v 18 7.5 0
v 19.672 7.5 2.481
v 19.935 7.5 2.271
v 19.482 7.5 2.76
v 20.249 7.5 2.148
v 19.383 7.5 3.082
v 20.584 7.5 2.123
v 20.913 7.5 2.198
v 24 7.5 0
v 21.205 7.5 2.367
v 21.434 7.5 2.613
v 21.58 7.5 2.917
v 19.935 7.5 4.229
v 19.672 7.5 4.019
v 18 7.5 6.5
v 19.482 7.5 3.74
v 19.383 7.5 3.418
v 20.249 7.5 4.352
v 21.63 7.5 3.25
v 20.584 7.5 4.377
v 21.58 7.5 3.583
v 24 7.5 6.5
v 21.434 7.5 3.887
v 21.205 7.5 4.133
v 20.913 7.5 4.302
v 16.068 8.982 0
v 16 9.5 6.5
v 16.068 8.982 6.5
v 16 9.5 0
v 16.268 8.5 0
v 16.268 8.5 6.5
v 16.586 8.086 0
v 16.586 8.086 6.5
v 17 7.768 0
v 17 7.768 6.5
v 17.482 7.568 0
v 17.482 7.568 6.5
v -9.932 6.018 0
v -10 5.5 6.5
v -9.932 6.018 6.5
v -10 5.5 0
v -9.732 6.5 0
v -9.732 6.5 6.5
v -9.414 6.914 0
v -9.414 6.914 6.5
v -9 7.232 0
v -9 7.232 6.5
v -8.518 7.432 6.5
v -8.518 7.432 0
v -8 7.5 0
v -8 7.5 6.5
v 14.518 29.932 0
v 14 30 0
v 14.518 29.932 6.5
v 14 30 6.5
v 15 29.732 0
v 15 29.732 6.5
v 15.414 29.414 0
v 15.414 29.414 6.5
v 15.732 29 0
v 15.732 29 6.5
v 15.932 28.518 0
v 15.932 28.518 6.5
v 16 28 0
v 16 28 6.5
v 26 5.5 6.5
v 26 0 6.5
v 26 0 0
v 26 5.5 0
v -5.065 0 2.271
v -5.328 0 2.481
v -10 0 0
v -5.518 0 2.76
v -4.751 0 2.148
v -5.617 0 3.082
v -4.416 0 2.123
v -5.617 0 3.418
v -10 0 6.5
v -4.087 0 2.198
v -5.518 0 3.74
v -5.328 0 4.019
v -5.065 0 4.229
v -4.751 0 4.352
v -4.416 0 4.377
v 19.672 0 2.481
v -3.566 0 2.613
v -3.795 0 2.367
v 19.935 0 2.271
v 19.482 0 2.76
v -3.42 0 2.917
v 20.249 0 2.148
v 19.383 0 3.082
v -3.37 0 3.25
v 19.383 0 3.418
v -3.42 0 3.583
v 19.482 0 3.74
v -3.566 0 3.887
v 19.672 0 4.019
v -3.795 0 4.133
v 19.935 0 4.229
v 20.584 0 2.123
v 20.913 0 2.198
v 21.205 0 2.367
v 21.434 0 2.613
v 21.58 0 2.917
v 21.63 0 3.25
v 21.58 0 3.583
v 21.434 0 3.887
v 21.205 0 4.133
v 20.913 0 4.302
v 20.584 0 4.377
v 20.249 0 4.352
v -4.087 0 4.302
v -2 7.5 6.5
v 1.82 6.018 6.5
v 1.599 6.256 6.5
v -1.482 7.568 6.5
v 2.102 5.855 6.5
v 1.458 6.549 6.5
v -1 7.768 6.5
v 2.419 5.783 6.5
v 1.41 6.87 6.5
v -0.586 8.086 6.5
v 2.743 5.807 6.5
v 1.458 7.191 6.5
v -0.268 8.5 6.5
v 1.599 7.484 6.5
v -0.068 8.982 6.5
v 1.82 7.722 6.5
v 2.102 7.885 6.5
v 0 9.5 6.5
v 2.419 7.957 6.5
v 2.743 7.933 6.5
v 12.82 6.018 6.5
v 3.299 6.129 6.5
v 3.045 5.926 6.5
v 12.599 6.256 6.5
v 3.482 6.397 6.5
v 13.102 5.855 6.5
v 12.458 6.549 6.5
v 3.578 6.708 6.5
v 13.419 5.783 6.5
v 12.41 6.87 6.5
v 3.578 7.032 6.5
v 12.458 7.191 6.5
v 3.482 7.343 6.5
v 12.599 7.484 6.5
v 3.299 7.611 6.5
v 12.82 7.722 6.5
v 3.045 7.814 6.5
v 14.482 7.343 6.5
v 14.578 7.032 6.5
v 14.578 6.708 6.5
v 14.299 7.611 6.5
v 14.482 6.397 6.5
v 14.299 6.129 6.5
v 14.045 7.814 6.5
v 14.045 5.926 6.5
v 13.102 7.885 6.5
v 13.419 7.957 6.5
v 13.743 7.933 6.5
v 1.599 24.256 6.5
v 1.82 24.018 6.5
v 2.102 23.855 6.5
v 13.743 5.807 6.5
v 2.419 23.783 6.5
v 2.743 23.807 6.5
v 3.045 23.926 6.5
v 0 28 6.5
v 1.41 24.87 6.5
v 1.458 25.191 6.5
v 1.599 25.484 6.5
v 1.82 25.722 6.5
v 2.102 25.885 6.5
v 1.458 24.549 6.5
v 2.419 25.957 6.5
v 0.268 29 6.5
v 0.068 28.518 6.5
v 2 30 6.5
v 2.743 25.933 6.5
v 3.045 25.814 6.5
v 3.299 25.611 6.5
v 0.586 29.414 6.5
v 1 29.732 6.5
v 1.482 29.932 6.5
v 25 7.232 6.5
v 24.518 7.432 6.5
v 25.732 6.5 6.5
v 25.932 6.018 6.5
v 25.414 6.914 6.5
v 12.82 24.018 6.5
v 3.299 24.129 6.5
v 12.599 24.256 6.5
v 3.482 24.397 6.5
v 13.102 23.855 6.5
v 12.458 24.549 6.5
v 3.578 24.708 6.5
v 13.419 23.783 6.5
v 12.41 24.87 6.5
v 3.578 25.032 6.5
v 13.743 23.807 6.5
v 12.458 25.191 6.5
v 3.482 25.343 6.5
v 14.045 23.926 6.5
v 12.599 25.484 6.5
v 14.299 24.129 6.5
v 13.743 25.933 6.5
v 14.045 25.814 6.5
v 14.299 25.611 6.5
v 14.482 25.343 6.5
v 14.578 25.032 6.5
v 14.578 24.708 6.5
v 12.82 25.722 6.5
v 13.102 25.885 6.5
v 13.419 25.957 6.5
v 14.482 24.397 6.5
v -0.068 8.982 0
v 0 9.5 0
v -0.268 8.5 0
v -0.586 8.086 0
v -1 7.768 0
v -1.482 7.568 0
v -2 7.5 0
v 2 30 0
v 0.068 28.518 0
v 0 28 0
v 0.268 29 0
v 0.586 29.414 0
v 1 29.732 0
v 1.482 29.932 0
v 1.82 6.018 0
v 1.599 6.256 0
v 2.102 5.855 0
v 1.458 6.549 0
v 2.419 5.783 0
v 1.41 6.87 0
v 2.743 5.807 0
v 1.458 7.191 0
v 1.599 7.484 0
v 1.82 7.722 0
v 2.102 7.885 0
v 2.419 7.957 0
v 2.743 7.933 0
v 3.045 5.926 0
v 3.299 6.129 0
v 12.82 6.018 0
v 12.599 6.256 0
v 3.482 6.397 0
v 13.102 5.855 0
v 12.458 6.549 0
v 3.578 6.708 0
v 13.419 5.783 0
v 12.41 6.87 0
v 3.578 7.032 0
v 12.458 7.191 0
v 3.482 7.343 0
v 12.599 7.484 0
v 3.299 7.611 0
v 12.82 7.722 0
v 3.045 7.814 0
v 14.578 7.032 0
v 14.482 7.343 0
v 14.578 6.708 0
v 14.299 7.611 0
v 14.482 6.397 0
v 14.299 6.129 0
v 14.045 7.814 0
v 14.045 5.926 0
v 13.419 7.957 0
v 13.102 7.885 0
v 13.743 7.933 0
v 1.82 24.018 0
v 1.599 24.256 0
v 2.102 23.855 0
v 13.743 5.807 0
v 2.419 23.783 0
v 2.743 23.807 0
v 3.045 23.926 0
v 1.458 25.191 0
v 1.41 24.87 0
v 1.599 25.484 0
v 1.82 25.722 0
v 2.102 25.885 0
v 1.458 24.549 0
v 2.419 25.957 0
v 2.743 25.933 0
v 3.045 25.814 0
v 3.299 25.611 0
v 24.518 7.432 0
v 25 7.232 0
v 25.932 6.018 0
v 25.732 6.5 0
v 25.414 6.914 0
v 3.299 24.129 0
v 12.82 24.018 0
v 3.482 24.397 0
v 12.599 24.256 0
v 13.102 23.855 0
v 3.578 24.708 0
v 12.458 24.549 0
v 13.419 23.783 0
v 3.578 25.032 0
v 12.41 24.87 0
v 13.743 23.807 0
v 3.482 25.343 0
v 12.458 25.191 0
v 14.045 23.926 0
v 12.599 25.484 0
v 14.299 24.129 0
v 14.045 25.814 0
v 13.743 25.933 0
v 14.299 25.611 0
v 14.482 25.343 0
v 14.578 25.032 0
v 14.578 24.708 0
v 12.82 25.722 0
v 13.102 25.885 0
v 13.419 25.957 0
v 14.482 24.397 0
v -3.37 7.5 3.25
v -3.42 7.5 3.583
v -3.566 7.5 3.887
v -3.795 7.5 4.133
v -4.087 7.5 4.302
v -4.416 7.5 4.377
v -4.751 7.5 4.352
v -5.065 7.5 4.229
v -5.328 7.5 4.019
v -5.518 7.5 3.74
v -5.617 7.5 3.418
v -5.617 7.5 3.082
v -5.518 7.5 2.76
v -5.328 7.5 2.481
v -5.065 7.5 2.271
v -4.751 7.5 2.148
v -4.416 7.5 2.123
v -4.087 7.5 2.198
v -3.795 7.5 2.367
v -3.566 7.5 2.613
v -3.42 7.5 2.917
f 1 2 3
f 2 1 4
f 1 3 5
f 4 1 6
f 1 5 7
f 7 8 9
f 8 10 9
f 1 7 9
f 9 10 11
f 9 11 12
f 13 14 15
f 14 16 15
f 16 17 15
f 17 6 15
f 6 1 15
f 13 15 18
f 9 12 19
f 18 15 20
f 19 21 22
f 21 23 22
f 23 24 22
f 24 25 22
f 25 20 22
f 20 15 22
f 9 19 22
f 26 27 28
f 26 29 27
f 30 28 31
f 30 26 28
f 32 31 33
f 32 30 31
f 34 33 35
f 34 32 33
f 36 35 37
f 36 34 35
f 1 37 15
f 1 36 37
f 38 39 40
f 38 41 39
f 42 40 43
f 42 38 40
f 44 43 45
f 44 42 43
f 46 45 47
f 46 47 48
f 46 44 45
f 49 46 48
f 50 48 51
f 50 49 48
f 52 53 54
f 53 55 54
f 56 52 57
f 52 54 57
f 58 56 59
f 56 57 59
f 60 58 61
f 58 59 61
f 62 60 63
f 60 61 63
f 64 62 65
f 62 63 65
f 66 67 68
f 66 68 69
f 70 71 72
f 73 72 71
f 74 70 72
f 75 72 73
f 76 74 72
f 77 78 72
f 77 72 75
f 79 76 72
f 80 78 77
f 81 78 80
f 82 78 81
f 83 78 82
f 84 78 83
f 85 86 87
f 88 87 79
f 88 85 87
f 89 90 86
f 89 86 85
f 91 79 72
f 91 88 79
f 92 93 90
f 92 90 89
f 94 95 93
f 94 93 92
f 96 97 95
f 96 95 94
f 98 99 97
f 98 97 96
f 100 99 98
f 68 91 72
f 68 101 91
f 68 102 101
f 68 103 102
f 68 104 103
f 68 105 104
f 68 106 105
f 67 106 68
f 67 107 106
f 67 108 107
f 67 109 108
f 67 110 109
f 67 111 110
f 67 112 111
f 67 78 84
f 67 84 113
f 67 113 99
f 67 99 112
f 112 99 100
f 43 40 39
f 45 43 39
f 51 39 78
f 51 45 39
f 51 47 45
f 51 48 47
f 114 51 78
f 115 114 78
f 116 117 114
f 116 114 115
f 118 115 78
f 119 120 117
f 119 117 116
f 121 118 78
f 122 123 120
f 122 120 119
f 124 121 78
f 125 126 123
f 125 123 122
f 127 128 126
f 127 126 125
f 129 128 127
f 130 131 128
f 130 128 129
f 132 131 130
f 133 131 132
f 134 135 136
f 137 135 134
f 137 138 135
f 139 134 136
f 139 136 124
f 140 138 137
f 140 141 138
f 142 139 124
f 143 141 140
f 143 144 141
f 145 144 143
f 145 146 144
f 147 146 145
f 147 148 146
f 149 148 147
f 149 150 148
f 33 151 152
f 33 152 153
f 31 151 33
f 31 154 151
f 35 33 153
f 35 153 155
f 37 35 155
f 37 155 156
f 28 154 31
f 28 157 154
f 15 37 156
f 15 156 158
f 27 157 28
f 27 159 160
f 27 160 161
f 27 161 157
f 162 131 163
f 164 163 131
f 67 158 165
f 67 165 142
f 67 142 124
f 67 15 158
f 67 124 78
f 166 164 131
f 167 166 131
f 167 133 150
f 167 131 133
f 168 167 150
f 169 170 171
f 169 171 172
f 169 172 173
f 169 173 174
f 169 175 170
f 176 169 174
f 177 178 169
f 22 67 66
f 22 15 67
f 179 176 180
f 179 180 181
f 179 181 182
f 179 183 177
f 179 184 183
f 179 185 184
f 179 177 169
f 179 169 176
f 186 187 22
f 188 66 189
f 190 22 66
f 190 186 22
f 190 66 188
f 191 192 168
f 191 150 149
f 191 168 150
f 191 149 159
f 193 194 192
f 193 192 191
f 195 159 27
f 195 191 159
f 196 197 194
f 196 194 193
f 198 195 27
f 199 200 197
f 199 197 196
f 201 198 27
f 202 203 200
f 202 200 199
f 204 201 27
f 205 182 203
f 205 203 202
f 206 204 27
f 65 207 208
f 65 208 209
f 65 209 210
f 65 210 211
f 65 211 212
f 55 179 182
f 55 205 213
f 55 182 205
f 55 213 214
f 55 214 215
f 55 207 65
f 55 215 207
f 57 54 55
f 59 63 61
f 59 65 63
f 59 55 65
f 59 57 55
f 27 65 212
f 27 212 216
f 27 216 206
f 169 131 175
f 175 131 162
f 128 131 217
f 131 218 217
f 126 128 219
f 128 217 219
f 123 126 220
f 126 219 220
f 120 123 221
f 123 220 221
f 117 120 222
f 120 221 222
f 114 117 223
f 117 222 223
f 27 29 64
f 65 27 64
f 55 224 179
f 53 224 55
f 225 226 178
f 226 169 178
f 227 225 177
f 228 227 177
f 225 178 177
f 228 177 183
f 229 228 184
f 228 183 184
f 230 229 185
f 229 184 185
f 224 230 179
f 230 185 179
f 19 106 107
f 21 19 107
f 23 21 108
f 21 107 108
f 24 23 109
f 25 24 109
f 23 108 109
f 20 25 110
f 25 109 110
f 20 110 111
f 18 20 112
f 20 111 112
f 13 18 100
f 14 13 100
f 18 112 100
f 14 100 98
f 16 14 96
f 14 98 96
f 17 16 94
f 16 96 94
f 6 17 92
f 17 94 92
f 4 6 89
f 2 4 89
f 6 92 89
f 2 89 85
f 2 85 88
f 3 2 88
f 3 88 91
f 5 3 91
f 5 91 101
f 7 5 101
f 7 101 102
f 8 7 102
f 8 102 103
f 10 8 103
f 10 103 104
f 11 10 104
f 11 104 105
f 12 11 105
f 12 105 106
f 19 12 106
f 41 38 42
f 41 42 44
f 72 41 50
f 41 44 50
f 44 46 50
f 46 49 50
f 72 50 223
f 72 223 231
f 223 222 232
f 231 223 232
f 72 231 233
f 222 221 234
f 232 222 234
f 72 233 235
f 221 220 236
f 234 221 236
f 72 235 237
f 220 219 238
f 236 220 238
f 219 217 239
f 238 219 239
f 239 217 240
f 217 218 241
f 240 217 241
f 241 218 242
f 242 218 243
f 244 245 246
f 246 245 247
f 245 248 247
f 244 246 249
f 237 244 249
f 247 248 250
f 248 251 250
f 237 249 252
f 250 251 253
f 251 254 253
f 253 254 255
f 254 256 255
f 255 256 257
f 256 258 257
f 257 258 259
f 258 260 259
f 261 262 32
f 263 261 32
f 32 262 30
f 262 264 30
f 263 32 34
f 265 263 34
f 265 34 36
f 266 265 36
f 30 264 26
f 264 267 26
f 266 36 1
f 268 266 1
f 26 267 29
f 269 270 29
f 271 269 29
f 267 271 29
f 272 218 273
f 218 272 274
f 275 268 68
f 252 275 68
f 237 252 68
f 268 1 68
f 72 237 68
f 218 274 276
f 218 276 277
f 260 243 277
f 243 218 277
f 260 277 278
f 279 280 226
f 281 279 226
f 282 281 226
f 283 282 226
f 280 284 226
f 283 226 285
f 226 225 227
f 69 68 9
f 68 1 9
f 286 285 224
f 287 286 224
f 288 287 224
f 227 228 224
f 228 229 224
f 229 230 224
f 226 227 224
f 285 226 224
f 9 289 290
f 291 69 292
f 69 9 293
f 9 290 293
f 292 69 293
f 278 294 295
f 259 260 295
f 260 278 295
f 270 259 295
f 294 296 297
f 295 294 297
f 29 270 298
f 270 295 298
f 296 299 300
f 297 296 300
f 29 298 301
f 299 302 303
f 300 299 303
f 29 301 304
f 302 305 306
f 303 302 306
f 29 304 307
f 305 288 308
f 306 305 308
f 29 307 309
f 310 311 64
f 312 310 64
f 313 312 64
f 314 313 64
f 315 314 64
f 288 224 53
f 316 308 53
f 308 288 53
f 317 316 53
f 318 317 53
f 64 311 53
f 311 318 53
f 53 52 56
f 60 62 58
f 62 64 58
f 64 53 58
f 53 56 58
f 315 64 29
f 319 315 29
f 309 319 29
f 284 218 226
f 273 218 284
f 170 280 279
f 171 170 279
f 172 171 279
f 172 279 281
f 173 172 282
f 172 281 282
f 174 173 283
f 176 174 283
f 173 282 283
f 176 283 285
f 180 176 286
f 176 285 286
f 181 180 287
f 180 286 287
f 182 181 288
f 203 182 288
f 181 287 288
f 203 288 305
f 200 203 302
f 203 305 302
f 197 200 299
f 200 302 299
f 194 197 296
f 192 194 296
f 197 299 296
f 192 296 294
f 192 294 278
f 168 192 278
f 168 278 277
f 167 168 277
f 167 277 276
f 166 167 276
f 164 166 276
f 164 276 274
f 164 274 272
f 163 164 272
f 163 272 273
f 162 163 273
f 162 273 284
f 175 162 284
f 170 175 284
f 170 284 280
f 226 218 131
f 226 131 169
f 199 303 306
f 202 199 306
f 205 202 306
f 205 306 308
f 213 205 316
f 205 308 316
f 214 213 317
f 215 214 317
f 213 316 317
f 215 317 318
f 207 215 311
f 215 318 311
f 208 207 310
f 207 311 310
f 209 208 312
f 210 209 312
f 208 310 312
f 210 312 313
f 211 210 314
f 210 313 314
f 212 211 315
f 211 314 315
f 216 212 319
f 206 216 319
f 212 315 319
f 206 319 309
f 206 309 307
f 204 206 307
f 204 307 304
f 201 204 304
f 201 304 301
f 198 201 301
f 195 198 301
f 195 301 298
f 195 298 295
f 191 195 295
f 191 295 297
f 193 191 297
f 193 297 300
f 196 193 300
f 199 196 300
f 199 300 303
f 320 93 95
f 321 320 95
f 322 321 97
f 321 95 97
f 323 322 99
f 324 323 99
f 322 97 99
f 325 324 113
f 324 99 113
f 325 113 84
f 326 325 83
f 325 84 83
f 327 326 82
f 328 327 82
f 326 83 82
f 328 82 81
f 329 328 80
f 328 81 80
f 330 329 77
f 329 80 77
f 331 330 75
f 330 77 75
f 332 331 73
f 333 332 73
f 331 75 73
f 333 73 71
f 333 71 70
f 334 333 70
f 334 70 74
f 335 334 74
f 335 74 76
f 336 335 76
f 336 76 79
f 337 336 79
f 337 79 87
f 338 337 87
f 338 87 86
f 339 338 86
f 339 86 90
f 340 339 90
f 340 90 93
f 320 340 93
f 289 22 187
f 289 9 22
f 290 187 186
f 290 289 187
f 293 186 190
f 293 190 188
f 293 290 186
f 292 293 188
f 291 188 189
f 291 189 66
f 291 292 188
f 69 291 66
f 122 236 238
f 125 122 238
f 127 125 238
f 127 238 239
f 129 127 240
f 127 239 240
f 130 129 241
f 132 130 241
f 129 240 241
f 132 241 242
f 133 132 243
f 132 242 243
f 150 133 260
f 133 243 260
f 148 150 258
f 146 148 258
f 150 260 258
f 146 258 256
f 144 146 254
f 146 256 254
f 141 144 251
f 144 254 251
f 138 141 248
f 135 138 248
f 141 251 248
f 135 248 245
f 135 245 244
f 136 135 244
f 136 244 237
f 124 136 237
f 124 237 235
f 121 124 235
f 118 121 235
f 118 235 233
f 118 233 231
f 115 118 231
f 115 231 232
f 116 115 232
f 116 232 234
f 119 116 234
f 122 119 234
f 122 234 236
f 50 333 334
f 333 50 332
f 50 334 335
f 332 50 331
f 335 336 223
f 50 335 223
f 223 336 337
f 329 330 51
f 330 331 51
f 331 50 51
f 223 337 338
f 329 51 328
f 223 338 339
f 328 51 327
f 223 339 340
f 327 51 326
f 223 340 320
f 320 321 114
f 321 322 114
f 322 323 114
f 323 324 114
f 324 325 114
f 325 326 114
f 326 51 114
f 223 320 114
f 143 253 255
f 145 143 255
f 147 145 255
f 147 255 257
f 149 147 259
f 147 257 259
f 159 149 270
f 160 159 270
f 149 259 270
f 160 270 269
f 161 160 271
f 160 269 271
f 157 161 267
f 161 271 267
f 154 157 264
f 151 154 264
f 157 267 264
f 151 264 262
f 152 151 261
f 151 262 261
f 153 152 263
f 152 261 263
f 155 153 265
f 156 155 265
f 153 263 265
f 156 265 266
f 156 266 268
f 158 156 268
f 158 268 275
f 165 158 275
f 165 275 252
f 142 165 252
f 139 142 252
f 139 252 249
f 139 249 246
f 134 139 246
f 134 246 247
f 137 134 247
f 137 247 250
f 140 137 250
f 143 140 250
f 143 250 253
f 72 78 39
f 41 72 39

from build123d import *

# Parameters (mm, degrees)
SKETCH1_W           = 16
SKETCH1_H           = 30
BOSS_EXTRUDE1_DEPTH = 6.5
SKETCH3_R           = 1.09
CUT_EXTRUDE1_DEPTH  = 7.5
FILLET1_R           = 2
SKETCH5_W           = 10
SKETCH5_H           = 7.5
BOSS_EXTRUDE2_DEPTH = 6.5
FILLET2_R           = 2
FILLET3_R           = 2
FILLET4_R           = 2
SKETCH4_R           = 1.13
CUT_EXTRUDE2_DEPTH  = 31


with BuildPart() as part:
    # Sketch1 → Boss-Extrude1 (new body)
    with BuildSketch(Plane.XY):
        with Locations((8, 15)):
            Rectangle(SKETCH1_W, SKETCH1_H)
    extrude(amount=BOSS_EXTRUDE1_DEPTH)

    # Sketch3 → Cut-Extrude1 (cut, through all)
    with BuildSketch(Plane(origin=(0, 0, 0), x_dir=(-1, 0, 0), z_dir=(0, 0, -1))):
        with Locations((-13.5, 6.87)):
            Circle(SKETCH3_R)
        with Locations((-2.5, 6.87)):
            Circle(SKETCH3_R)
        with Locations((-2.5, 24.87)):
            Circle(SKETCH3_R)
        with Locations((-13.5, 24.87)):
            Circle(SKETCH3_R)
    extrude(amount=-CUT_EXTRUDE1_DEPTH, mode=Mode.SUBTRACT)

    # Fillet1
    fillet1_edges = [part.edges().sort_by_distance(p)[0] for p in [
        (0, 30, 3.25),
        (16, 30, 3.25),
    ]]
    fillet(fillet1_edges, radius=FILLET1_R)

    # Sketch5 → Boss-Extrude2 (add)
    with BuildSketch(Plane.XY.offset(6.5)):
        with Locations((-5, 3.75)):
            Rectangle(SKETCH5_W, SKETCH5_H)
        with Locations((21, 3.75)):
            Rectangle(SKETCH5_W, SKETCH5_H)
    extrude(amount=-BOSS_EXTRUDE2_DEPTH)

    # Fillet2
    fillet2_edges = [part.edges().sort_by_distance(p)[0] for p in [
        (0, 7.5, 3.25),
        (16, 7.5, 3.25),
    ]]
    fillet(fillet2_edges, radius=FILLET2_R)

    # Fillet3
    fillet3_edges = [part.edges().sort_by_distance(p)[0] for p in [
        (26, 7.5, 3.25),
    ]]
    fillet(fillet3_edges, radius=FILLET3_R)

    # Fillet4
    fillet4_edges = [part.edges().sort_by_distance(p)[0] for p in [
        (-10, 7.5, 3.25),
    ]]
    fillet(fillet4_edges, radius=FILLET4_R)

    # Sketch4 → Cut-Extrude2 (cut, through all)
    with BuildSketch(Plane.XZ):
        with Locations((20.5, 3.25)):
            Circle(SKETCH4_R)
        with Locations((-4.5, 3.25)):
            Circle(SKETCH4_R)
    extrude(amount=-CUT_EXTRUDE2_DEPTH, mode=Mode.SUBTRACT)


solid = part.part
